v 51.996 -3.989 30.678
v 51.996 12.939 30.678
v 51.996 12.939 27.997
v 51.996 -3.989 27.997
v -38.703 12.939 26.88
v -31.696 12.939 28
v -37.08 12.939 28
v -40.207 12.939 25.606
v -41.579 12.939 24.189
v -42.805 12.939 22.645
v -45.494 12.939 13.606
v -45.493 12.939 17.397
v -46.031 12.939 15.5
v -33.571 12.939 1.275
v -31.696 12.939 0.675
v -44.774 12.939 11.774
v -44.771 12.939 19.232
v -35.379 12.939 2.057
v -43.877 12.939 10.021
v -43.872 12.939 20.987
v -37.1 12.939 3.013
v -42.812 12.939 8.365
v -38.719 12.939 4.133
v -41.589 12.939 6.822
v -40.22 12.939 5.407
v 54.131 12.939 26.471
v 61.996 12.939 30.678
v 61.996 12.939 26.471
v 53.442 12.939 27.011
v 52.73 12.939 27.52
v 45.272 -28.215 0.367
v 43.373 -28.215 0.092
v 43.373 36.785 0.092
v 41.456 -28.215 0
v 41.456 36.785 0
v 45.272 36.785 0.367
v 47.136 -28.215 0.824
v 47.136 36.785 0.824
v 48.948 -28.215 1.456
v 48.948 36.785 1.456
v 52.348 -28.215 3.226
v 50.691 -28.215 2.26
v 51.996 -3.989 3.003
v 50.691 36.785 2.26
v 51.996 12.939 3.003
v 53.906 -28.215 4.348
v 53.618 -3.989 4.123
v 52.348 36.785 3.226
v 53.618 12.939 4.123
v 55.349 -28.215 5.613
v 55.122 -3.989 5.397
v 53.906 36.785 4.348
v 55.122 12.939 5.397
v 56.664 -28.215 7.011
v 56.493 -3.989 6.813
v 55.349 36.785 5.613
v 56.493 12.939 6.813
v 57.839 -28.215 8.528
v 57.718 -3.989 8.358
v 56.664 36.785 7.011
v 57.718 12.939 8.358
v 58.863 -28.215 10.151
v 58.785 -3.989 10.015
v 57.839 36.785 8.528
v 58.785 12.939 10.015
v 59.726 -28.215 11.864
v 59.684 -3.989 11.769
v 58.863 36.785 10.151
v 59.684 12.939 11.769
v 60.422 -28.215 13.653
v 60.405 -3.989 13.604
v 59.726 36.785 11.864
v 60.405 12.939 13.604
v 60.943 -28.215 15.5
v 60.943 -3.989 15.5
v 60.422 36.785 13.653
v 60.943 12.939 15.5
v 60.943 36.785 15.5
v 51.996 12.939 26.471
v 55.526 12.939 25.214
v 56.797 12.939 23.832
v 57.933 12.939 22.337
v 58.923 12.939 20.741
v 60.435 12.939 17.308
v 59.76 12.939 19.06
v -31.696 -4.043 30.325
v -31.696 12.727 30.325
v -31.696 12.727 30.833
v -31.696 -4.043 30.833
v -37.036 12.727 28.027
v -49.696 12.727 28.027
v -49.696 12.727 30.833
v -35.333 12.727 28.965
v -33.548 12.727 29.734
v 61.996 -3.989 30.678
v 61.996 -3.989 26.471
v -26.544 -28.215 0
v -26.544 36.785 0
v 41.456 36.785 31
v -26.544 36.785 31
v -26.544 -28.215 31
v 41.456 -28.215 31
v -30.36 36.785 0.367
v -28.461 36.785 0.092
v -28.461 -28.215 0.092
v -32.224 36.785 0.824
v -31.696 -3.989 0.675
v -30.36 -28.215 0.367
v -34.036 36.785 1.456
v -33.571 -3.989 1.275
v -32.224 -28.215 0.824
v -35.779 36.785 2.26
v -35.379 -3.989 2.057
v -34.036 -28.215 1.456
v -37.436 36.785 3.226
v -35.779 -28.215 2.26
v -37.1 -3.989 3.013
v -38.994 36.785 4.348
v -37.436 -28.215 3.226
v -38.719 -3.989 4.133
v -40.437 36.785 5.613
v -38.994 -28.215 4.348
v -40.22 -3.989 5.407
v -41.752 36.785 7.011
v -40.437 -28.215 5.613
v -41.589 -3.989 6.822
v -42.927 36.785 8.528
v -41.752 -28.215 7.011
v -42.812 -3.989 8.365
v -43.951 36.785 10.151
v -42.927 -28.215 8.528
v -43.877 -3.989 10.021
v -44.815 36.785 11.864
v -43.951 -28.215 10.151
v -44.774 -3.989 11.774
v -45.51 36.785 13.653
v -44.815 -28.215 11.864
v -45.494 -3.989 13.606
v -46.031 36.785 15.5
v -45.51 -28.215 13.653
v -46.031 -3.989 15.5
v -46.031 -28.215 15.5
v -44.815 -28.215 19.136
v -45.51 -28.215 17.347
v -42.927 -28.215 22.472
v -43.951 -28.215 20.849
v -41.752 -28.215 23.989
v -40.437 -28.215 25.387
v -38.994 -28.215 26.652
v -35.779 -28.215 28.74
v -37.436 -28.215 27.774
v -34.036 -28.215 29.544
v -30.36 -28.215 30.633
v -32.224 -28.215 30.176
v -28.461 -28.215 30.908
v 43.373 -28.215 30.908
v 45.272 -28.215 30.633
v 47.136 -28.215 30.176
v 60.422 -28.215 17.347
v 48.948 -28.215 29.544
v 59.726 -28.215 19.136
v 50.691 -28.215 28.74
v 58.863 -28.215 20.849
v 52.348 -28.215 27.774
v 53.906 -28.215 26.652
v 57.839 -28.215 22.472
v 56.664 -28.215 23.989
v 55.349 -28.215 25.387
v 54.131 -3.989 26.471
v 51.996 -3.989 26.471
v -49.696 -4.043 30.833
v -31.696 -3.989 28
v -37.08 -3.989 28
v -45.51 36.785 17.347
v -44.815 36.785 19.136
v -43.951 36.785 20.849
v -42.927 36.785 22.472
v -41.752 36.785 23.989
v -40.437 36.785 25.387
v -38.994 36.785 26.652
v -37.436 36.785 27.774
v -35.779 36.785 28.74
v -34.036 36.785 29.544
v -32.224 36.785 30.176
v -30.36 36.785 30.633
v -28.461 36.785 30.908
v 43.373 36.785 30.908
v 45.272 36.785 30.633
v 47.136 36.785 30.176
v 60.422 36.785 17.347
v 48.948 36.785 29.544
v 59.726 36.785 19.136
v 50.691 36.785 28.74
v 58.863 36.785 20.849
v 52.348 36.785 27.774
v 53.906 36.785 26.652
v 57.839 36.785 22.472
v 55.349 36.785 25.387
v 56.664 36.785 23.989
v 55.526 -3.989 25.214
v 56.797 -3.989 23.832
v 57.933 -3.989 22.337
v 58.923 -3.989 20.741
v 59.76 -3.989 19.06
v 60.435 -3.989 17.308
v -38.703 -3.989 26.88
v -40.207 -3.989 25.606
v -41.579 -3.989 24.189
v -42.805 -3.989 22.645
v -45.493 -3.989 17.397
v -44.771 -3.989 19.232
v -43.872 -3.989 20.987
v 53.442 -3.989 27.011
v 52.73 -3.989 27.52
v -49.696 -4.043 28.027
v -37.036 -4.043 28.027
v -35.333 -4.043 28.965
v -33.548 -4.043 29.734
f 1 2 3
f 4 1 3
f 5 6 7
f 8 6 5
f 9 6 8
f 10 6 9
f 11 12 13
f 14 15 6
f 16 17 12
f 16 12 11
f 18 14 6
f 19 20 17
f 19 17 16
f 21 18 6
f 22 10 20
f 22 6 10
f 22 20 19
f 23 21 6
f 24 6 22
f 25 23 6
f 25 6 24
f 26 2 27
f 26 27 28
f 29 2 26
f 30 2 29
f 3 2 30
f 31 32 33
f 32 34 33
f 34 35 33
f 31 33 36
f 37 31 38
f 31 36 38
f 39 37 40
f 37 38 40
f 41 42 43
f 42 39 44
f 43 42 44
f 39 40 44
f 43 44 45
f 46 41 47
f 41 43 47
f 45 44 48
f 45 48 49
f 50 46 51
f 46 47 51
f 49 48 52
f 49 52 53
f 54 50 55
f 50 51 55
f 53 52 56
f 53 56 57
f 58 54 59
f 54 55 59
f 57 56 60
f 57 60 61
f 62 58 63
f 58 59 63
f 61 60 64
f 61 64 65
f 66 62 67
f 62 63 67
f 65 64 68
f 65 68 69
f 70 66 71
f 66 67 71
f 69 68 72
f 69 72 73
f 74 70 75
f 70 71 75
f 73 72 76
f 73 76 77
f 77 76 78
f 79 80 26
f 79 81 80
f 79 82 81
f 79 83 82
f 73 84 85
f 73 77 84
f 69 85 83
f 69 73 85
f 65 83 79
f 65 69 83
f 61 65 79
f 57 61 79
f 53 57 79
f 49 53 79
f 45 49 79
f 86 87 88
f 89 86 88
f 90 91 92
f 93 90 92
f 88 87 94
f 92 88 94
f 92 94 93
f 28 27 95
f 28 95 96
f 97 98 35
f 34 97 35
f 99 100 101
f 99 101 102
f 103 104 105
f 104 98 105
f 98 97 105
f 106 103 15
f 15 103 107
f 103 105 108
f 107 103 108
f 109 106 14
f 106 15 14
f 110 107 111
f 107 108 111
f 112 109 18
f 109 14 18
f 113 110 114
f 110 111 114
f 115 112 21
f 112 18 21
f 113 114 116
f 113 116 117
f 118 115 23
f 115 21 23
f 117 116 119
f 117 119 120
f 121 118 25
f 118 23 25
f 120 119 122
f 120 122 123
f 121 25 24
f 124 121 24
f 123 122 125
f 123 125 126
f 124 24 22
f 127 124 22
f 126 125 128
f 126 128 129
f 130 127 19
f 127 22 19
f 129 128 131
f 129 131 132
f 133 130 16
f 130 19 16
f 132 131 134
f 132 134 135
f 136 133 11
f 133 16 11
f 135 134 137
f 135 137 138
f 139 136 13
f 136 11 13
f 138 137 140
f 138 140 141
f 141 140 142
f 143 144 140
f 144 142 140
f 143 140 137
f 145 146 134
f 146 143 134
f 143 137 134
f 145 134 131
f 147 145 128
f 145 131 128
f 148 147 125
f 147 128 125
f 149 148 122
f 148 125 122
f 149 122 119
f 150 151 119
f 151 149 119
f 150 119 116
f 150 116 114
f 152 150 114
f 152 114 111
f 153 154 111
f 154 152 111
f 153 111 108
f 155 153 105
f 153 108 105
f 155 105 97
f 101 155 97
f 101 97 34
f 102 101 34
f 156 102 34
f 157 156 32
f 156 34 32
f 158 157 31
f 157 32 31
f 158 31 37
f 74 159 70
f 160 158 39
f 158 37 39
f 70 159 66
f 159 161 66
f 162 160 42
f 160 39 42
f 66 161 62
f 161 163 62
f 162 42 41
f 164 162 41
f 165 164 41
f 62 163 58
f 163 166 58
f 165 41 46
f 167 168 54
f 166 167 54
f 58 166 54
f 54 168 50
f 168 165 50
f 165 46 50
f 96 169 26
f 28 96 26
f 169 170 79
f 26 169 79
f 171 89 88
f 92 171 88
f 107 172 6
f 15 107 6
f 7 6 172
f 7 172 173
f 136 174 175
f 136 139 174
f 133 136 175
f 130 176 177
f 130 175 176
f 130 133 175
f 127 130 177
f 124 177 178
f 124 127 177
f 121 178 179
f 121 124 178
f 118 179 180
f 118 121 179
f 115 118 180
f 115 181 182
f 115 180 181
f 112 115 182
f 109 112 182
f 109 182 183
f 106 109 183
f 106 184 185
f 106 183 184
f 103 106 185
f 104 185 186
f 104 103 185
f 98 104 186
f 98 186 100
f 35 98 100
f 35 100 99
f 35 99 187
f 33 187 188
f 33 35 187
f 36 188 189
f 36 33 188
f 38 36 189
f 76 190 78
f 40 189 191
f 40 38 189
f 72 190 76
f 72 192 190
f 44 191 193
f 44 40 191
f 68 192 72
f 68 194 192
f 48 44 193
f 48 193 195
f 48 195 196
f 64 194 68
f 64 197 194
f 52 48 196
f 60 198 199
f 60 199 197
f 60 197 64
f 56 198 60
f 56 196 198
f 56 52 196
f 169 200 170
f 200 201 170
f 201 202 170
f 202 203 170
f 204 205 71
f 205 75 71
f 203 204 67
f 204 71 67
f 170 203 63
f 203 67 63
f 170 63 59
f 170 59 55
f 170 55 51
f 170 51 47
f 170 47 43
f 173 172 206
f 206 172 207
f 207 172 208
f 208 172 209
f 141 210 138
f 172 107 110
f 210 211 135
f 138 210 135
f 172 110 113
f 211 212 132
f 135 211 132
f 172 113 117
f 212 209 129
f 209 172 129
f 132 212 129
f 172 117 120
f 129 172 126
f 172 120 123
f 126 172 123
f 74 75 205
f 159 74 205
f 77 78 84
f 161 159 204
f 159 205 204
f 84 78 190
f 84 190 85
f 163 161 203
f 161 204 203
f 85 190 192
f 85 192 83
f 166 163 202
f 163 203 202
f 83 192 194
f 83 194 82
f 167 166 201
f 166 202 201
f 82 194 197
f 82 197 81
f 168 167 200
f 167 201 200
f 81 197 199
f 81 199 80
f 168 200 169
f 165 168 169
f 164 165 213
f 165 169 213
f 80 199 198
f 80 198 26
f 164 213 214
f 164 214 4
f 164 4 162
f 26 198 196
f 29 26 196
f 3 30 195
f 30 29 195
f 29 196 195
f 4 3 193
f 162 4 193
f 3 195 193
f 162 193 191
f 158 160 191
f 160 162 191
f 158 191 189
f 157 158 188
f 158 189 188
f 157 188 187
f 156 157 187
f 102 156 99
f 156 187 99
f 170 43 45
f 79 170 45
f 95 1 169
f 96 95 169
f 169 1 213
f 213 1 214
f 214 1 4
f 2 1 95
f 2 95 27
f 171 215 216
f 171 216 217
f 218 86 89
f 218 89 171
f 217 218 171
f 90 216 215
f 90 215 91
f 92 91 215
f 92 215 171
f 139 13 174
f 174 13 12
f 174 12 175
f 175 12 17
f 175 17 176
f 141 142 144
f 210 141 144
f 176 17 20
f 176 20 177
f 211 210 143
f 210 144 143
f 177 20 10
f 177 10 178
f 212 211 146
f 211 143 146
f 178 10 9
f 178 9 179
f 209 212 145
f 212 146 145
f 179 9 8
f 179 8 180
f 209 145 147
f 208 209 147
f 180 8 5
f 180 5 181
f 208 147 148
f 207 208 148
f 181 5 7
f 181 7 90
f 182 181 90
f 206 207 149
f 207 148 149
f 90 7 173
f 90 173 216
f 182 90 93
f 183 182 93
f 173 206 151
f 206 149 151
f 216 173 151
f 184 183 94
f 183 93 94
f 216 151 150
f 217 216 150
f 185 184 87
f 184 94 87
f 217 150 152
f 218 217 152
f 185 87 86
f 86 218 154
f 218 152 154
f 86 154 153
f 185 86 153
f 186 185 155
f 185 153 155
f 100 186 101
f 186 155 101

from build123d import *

# Parameters (mm, degrees)
SKETCH1_W           = 108
SKETCH1_H           = 65
BOSS_EXTRUDE1_DEPTH = 31
FILLET1_R           = 20
SKETCH2_W           = 11.536276889
SKETCH2_H           = 16.92742392
SKETCH2_W_2         = 26.268605015
CUT_EXTRUDE1_DEPTH  = 28
SKETCH3_W           = 2.805413746
SKETCH3_H           = 16.76973244
BOSS_EXTRUDE2_DEPTH = 18
SKETCH4_W           = 4.207099317
SKETCH4_H           = 16.92742392
BOSS_EXTRUDE3_DEPTH = 10


with BuildPart() as part:
    # Sketch1 → Boss-Extrude1 (new body)
    with BuildSketch(Plane.XY):
        with Locations((7.455924682, 4.284519209)):
            Rectangle(SKETCH1_W, SKETCH1_H)
    extrude(amount=BOSS_EXTRUDE1_DEPTH)

    # Fillet1
    # the kernel refuses this fillet: 20 mm, written as the material it takes off along each edge
    with BuildSketch(Plane(origin=(61.455924682, 86.784519209, 0), x_dir=(0, 0, 1), z_dir=(0, -1, 0)), Plane(origin=(-46.544075318, -78.215480791, 0), x_dir=(0, 0, 1), z_dir=(0, 1, 0))) as fillet1_piece_1:
        with BuildLine():
            CenterArc((FILLET1_R, FILLET1_R), FILLET1_R, 180, 90)
            Line((0, FILLET1_R), (0, 0))
            Line((0, 0), (FILLET1_R, 0))
        make_face()
    extrude(amount=165, mode=Mode.SUBTRACT)
    with BuildSketch(Plane(origin=(61.455924682, 86.784519209, 31), x_dir=(0, 0, -1), z_dir=(0, -1, 0)), Plane(origin=(-46.544075318, -78.215480791, 31), x_dir=(0, 0, -1), z_dir=(0, 1, 0))) as fillet1_piece_2:
        with BuildLine():
            CenterArc((FILLET1_R, -FILLET1_R), FILLET1_R, 90, 90)
            Line((0, -FILLET1_R), (0, 0))
            Line((0, 0), (FILLET1_R, 0))
        make_face()
    extrude(amount=165, mode=Mode.SUBTRACT)

    # Sketch2 → Cut-Extrude1 (cut)
    with BuildSketch(Plane(origin=(0, 0, 0), x_dir=(-1, 0, 0), z_dir=(0, 0, -1))):
        with Locations((-57.764364891, 4.474974683)):
            Rectangle(SKETCH2_W, SKETCH2_H)
        with Locations((44.830685277, 4.474974683)):
            Rectangle(SKETCH2_W_2, SKETCH2_H)
    extrude(amount=-CUT_EXTRUDE1_DEPTH, mode=Mode.SUBTRACT)

    # Sketch3 → Boss-Extrude2 (add)
    with BuildSketch(Plane.ZY.offset(31.696382769)):
        with Locations((29.429796439, 4.342088928)):
            Rectangle(SKETCH3_W, SKETCH3_H)
    extrude(amount=BOSS_EXTRUDE2_DEPTH)

    # Sketch4 → Boss-Extrude3 (add)
    with BuildSketch(Plane(origin=(51.996226446, 0, 0), x_dir=(0, 0, -1), z_dir=(1, 0, 0))):
        with Locations((-28.574605447, 4.474974683)):
            Rectangle(SKETCH4_W, SKETCH4_H)
    extrude(amount=BOSS_EXTRUDE3_DEPTH)


solid = part.part
